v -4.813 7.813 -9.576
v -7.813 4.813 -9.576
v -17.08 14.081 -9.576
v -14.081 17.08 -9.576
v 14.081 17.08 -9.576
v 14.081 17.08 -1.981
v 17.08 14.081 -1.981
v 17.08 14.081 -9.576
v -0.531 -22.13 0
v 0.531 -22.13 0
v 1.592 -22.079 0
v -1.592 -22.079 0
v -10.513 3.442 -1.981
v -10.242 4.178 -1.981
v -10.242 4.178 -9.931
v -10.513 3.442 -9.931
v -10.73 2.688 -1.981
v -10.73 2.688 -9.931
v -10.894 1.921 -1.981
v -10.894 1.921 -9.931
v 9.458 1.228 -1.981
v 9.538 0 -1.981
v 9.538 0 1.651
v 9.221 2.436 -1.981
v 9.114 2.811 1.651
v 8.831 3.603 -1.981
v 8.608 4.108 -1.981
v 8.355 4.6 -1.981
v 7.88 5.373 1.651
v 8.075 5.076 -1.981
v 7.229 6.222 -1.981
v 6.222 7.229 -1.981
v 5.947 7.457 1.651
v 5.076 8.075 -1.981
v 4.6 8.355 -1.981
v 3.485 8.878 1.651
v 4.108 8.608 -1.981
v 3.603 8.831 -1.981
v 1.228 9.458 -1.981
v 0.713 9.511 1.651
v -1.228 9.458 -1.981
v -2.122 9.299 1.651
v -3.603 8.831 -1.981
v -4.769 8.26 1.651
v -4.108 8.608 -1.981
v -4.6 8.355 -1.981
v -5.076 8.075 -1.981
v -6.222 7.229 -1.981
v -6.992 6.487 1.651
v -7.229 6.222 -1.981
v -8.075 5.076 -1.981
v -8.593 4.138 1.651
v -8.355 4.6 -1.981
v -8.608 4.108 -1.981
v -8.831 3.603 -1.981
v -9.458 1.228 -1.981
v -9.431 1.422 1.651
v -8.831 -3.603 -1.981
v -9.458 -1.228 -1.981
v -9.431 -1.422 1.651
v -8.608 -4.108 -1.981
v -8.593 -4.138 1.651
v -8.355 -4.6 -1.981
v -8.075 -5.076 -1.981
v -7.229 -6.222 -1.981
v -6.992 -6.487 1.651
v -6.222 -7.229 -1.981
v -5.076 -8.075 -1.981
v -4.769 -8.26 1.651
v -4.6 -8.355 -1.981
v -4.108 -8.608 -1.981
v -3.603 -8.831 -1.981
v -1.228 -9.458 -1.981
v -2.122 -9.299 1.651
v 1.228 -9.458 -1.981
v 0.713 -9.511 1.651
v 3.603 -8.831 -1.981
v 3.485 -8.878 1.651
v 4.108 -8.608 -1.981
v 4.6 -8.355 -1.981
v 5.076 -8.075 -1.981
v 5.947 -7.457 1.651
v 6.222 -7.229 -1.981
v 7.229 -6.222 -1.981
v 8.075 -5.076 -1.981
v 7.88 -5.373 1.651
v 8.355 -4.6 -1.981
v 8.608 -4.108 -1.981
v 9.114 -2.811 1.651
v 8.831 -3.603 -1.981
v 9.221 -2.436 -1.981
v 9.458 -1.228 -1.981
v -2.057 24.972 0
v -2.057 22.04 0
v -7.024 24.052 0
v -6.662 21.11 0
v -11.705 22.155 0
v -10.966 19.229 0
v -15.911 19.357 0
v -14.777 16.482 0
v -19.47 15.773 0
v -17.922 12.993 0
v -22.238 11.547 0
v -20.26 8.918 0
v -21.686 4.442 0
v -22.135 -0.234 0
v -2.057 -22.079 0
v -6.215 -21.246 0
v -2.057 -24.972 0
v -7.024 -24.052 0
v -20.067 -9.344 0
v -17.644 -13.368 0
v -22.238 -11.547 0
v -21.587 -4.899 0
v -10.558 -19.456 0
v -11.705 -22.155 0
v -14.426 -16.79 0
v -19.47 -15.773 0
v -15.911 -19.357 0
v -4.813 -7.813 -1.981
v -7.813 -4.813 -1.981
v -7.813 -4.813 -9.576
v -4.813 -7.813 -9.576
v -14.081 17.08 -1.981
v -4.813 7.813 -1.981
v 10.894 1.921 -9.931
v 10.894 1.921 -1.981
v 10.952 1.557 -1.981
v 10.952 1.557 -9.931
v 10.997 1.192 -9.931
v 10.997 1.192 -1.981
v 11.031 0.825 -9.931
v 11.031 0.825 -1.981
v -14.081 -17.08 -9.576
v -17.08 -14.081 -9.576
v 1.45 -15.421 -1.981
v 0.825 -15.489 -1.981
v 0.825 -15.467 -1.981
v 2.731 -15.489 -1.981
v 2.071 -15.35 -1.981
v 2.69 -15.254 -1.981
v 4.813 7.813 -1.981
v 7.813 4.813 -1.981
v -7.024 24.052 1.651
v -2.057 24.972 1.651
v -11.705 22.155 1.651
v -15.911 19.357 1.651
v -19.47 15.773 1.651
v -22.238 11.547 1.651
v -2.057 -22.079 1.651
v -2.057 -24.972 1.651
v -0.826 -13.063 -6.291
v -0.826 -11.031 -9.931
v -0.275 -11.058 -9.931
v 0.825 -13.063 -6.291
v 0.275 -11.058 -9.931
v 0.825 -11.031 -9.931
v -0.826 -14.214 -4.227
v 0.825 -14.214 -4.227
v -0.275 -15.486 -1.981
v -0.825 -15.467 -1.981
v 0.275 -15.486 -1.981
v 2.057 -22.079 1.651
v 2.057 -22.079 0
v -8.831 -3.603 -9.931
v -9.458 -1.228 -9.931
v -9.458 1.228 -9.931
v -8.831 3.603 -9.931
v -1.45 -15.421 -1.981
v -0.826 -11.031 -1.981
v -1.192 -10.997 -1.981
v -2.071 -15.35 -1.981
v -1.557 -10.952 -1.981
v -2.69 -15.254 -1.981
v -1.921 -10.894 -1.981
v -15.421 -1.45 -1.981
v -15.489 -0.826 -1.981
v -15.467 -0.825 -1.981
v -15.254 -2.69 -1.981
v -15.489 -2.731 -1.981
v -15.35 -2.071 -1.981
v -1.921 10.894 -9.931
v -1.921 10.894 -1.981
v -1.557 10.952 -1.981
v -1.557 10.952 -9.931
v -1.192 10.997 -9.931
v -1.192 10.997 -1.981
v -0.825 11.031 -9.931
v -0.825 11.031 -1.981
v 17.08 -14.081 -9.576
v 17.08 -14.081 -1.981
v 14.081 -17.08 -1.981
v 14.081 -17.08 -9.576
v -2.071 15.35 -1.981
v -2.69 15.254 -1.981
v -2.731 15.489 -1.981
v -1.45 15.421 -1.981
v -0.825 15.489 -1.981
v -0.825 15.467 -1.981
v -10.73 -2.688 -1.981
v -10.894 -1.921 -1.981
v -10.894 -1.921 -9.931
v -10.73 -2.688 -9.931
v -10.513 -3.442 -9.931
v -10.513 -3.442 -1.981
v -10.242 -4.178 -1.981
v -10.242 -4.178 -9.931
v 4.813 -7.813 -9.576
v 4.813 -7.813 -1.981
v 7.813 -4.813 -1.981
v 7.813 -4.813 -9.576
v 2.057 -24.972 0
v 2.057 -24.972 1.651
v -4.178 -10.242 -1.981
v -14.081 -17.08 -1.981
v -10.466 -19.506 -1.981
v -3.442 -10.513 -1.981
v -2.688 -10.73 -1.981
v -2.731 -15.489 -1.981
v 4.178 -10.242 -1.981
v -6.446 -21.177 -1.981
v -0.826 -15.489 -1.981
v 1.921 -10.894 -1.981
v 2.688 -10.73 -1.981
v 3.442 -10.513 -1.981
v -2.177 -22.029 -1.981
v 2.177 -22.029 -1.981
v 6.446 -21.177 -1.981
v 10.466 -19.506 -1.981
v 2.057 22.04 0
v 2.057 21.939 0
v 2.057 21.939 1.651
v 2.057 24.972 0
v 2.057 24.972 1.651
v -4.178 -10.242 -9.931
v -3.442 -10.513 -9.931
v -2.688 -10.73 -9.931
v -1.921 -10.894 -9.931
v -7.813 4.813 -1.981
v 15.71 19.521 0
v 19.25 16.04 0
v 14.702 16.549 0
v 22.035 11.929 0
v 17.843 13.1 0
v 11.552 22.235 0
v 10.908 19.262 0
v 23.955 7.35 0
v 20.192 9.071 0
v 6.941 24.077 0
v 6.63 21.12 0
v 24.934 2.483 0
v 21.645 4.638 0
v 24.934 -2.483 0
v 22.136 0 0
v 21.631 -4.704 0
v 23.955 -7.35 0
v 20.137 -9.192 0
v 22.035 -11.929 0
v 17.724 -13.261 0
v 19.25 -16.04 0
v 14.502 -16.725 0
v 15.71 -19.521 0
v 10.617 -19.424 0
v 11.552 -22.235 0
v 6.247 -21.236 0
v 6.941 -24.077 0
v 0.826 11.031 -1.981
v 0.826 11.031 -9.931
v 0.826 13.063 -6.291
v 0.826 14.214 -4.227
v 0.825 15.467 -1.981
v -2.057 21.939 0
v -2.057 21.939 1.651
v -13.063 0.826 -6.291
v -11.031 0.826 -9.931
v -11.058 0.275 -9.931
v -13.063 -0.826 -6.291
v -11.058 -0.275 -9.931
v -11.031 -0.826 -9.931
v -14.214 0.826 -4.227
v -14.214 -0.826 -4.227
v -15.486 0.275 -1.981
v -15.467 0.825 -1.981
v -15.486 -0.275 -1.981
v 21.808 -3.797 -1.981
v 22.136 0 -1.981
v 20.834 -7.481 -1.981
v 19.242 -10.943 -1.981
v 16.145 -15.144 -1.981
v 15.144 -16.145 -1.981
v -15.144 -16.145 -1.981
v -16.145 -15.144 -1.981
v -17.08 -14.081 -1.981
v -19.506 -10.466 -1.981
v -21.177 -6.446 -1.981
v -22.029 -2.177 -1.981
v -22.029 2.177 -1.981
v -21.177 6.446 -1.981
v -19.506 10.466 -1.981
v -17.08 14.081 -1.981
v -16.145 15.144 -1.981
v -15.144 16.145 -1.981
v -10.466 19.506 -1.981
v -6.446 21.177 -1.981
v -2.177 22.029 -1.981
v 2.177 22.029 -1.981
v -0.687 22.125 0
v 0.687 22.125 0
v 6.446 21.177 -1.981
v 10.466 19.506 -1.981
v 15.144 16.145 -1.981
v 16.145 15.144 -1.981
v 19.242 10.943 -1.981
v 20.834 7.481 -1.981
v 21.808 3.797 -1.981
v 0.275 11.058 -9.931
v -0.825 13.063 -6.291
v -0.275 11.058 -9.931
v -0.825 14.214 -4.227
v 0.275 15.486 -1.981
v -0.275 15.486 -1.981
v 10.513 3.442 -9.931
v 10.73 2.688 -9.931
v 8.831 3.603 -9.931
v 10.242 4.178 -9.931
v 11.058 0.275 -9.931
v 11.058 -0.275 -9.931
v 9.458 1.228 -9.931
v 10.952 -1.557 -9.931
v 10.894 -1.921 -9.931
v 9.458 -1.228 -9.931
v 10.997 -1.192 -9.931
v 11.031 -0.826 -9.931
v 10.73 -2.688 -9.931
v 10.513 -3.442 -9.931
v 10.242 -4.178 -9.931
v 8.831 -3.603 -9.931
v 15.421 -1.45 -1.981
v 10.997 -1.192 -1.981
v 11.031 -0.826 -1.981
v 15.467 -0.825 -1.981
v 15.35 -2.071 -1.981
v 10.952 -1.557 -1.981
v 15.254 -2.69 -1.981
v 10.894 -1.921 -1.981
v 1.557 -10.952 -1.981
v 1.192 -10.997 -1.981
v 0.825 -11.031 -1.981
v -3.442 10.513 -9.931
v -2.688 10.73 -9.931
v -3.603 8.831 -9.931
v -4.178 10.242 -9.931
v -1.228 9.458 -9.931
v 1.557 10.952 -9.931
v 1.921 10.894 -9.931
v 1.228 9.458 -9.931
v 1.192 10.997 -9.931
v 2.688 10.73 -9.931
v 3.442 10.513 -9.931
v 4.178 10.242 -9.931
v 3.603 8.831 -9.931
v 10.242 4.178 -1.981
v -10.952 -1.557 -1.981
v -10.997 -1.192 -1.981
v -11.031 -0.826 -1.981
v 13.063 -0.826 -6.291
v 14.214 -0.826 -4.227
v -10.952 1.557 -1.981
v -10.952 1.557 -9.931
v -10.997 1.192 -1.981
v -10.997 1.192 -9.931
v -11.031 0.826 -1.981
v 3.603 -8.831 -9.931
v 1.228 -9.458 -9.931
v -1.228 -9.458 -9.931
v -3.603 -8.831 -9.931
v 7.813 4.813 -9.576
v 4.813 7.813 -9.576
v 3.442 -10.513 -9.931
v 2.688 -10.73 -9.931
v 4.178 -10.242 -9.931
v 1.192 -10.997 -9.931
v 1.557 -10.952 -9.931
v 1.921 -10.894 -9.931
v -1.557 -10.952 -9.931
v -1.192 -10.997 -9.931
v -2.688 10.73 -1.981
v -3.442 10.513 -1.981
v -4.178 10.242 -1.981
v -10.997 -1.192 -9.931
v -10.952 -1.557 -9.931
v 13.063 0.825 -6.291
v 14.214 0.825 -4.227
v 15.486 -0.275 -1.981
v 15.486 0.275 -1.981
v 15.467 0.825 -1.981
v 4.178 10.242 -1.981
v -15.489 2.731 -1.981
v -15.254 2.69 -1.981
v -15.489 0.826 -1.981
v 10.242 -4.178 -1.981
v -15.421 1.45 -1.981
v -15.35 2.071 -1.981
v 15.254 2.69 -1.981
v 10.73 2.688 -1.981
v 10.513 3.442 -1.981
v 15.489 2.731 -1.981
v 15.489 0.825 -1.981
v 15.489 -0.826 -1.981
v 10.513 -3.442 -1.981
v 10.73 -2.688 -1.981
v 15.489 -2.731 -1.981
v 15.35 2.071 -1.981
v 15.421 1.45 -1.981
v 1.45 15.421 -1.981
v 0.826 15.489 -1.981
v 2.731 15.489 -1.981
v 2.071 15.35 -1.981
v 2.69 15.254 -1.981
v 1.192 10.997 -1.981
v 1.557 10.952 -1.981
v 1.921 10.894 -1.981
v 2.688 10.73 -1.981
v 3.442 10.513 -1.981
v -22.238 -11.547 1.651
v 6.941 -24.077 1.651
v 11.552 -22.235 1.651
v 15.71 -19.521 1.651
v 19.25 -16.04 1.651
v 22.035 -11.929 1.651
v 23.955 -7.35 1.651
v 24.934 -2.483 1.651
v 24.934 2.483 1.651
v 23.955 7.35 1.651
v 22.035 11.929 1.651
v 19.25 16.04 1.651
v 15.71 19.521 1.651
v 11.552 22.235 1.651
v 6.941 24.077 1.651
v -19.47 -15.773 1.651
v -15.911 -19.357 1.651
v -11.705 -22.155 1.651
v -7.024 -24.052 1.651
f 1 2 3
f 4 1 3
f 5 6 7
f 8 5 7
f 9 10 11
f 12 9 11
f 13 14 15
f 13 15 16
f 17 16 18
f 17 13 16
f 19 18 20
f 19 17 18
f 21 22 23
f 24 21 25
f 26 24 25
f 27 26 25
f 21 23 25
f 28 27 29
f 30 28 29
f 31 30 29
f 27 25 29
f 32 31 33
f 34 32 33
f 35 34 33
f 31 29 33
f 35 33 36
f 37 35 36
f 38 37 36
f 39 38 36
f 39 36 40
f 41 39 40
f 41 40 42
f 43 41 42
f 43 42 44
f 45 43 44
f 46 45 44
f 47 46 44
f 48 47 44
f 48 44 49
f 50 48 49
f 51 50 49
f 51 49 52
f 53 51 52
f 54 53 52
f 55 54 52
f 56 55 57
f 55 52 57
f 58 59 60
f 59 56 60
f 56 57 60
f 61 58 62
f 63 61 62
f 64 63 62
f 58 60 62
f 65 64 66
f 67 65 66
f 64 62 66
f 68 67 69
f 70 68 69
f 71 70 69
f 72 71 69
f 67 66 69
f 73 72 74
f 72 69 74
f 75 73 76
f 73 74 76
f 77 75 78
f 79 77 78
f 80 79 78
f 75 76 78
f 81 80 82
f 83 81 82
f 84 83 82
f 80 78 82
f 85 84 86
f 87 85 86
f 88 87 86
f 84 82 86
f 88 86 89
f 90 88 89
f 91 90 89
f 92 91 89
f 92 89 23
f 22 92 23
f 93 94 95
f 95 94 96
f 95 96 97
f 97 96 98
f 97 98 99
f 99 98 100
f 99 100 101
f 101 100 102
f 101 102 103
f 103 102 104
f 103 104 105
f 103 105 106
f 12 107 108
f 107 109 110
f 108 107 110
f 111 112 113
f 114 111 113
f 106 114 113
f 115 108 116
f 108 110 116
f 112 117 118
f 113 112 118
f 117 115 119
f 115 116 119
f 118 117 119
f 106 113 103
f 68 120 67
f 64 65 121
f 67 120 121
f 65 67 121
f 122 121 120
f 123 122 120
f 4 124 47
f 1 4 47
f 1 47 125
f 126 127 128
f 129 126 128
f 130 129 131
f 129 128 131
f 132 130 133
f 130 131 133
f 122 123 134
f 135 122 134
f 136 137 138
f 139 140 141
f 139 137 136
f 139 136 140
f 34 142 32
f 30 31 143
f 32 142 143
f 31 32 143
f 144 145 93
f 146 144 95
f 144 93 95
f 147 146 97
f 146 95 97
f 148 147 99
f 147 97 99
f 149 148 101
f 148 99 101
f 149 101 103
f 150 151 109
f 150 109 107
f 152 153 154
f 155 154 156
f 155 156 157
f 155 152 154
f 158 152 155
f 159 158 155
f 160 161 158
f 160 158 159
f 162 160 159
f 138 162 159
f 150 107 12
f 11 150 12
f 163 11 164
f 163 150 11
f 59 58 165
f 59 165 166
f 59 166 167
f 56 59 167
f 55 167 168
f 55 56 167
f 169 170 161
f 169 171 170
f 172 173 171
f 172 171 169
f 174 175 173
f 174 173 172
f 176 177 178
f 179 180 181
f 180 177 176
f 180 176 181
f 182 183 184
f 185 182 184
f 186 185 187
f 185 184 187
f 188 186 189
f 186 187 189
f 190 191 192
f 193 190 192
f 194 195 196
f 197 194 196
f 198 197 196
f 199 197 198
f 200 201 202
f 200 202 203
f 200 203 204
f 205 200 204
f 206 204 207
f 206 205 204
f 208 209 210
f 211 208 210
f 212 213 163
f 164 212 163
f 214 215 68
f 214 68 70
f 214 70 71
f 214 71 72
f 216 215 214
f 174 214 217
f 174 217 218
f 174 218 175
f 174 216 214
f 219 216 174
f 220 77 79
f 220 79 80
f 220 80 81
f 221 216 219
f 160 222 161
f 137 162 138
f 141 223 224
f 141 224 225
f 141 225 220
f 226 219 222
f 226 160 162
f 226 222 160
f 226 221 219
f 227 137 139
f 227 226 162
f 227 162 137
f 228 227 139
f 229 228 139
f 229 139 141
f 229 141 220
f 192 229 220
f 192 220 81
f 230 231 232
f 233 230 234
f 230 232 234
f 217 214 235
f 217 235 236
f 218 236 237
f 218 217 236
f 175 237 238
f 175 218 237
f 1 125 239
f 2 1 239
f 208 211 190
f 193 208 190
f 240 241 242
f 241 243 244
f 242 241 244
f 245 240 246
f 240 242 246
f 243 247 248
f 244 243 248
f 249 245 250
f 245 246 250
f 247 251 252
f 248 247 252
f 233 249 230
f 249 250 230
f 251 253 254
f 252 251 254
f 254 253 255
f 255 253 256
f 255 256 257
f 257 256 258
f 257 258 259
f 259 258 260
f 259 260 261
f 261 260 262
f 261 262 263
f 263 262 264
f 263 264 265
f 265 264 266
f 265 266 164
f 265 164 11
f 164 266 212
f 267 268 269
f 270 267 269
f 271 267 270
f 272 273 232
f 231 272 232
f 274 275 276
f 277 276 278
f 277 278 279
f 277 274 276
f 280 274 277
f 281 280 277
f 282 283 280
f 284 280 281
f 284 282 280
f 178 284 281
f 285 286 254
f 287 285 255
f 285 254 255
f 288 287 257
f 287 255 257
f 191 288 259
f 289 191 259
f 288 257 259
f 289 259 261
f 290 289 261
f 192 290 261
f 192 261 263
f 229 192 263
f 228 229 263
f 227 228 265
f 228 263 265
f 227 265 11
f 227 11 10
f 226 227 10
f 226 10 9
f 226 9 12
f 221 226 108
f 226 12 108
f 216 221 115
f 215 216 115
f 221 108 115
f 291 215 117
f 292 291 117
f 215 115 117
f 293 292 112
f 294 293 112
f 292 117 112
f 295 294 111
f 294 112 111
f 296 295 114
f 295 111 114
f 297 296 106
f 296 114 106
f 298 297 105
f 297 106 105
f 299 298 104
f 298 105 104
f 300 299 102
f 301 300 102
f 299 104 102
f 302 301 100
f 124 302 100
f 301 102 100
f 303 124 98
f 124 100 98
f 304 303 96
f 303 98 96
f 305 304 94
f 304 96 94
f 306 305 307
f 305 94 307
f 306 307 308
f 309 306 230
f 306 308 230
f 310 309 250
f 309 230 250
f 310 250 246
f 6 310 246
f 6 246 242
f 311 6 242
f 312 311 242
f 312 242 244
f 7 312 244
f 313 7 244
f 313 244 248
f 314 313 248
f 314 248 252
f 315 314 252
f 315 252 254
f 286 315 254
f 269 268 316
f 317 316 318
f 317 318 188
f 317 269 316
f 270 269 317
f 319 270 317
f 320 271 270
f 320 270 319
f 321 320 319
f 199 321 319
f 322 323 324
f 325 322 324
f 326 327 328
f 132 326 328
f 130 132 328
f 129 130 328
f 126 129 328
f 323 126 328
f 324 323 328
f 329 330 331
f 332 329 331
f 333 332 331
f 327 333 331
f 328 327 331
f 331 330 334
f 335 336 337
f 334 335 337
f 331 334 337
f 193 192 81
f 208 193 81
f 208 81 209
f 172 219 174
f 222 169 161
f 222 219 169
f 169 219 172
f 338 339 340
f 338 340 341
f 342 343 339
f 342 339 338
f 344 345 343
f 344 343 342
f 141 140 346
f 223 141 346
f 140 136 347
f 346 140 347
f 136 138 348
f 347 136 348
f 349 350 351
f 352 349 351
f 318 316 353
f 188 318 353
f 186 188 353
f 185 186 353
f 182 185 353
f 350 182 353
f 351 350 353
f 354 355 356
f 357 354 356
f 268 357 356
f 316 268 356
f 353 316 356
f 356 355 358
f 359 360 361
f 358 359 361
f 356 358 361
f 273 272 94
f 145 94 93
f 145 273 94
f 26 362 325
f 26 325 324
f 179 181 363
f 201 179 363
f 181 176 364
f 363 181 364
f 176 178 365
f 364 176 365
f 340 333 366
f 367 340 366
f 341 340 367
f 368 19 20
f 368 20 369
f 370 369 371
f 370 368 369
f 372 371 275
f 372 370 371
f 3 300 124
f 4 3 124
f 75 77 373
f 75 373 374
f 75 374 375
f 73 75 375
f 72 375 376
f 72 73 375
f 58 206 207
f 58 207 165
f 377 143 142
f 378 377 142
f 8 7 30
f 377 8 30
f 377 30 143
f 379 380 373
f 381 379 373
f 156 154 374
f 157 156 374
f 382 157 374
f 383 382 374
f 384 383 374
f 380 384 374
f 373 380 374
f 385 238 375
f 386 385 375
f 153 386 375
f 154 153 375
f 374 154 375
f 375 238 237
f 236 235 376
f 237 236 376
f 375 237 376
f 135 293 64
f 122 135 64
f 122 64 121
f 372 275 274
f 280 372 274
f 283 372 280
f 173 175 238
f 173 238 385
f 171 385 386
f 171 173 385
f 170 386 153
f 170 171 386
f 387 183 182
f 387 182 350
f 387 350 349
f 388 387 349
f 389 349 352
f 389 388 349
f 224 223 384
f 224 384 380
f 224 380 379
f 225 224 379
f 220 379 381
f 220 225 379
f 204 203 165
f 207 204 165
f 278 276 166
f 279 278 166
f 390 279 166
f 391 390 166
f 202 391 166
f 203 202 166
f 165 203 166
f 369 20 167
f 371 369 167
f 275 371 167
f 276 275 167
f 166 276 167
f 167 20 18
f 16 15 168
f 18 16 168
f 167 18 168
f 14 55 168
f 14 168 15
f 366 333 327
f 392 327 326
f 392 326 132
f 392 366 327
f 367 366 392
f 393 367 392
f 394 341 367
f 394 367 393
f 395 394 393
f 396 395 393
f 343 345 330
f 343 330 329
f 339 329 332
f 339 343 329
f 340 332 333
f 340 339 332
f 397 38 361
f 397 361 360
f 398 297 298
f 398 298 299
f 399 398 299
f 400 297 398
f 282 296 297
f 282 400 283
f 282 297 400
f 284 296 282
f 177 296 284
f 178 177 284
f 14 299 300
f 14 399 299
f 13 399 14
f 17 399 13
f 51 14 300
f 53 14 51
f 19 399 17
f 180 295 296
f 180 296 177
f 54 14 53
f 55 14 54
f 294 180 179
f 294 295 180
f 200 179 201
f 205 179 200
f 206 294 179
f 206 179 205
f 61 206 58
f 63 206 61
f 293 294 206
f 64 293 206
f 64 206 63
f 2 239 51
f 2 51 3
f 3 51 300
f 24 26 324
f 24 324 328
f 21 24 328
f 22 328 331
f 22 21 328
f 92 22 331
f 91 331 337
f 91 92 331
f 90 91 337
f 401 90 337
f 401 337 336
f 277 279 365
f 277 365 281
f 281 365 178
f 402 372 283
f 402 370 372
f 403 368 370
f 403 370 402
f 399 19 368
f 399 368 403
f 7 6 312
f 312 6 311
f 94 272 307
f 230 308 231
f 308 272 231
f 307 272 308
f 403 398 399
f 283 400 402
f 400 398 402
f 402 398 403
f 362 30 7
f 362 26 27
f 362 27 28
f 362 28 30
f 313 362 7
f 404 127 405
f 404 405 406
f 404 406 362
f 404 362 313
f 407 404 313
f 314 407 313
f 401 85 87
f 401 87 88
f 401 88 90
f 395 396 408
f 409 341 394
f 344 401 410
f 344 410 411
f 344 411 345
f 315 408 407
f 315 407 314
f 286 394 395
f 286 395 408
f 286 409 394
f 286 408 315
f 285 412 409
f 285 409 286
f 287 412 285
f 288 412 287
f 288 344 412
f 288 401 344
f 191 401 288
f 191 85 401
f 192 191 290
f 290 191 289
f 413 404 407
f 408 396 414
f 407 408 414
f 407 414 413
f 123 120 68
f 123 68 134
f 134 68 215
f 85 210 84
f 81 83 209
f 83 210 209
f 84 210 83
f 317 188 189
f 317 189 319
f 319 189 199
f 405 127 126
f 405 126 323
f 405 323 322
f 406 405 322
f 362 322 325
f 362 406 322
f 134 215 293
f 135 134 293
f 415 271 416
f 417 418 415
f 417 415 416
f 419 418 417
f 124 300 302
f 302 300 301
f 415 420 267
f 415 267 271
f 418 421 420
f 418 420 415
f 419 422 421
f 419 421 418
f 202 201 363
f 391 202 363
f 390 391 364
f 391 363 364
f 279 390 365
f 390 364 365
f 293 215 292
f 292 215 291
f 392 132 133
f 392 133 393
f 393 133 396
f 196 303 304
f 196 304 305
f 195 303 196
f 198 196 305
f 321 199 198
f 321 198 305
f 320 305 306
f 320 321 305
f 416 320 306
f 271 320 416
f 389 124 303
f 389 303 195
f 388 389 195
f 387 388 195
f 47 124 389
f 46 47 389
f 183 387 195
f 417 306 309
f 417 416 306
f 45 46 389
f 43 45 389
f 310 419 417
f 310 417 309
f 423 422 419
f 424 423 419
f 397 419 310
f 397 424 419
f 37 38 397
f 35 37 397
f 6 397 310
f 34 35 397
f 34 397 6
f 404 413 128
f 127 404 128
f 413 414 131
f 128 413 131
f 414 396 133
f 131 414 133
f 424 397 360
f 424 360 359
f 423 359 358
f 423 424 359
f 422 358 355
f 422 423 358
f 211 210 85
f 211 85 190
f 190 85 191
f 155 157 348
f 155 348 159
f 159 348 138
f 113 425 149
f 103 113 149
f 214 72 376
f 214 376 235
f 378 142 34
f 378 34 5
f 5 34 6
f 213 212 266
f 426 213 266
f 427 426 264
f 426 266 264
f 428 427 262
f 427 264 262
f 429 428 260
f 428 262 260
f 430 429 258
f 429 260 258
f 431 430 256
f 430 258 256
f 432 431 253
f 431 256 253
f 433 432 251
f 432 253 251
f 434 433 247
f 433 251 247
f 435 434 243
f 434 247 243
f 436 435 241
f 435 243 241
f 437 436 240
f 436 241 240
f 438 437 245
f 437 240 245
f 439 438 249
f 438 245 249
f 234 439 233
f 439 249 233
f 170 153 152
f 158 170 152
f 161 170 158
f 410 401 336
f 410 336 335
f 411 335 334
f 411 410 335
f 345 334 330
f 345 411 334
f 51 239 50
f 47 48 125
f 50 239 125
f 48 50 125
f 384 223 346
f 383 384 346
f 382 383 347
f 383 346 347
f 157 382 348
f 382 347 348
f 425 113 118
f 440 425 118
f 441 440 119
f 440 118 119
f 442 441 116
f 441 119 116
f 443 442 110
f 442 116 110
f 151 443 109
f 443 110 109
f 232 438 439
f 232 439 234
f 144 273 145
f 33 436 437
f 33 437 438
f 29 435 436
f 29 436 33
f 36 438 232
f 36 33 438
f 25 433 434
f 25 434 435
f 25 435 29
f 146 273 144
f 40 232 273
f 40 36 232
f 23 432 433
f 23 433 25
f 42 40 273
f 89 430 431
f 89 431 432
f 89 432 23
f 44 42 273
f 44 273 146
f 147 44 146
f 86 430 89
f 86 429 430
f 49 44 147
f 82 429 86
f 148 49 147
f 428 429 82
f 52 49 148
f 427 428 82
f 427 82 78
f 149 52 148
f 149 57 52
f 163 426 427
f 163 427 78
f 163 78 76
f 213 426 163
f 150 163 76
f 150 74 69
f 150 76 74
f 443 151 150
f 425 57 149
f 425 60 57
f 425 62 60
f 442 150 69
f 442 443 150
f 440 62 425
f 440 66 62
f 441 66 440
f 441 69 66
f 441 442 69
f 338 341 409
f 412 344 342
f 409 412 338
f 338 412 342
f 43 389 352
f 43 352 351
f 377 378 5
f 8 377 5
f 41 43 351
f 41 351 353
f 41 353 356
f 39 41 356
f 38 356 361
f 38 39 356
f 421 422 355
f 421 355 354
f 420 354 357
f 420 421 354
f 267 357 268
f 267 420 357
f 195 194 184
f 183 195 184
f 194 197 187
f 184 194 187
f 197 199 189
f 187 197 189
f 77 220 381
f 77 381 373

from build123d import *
from build123d.topology import SkipClean

# Parameters (mm, degrees)
SKETCH1_R           = 25.0571
BOSS_EXTRUDE1_DEPTH = 1.651
SKETCH2_W           = 50.1142
SKETCH2_H           = 50.1142
CUT_EXTRUDE1_DEPTH  = 36.474530607
SKETCH3_W           = 4.1148
SKETCH3_H           = 6.235392346
SKETCH3_H_2         = 5.956607654
CUT_EXTRUDE2_DEPTH  = 36.474530607
SKETCH4_R           = 22.1361
BOSS_EXTRUDE2_DEPTH = 1.9812
SKETCH6_R           = 9.5377
CUT_EXTRUDE3_DEPTH  = 36.562290462
BOSS_EXTRUDE3_DEPTH = 7.5946
BOSS_EXTRUDE4_DEPTH = 7.9502
REVOLVE1_ANGLE      = 20
CUT_EXTRUDE4_START  = -7.9502
CUT_EXTRUDE4_DEPTH  = 7.9502
CIRPATTERN1_COUNT   = 4


# Read off the part's stored shape, not the designer's step: Revolve1
with BuildPart() as part:
    # Sketch1 → Boss-Extrude1 (new body)
    with BuildSketch(Plane.XY):
        with Locations(Location((0, 0, 0), (0, 0, 180))):
            Circle(SKETCH1_R)
    extrude(amount=BOSS_EXTRUDE1_DEPTH)

    # Sketch2 → Cut-Extrude1 (cut, through all)
    with BuildSketch(Plane.XY.offset(1.651)):
        with Locations((-47.2948, 0)):
            Rectangle(SKETCH2_W, SKETCH2_H)
    extrude(amount=-CUT_EXTRUDE1_DEPTH, mode=Mode.SUBTRACT)

    # Sketch3 → Cut-Extrude2 (cut, through all)
    with BuildSketch(Plane.XY.offset(1.651)):
        with Locations((0, 25.0571)):
            Rectangle(SKETCH3_W, SKETCH3_H)
        with Locations((0, -25.0571)):
            Rectangle(SKETCH3_W, SKETCH3_H_2)
    extrude(amount=-CUT_EXTRUDE2_DEPTH, mode=Mode.SUBTRACT)

    # Sketch4 → Boss-Extrude2 (add)
    with BuildSketch(Plane(origin=(0, 0, 0), x_dir=(-1, 0, 0), z_dir=(0, 0, -1))):
        with Locations(Location((0, 0, 0), (0, 0, 180))):
            Circle(SKETCH4_R)
    extrude(amount=BOSS_EXTRUDE2_DEPTH)

    # Sketch6 → Cut-Extrude3 (cut, through all)
    with BuildSketch(Plane.XY.offset(1.651)):
        Circle(SKETCH6_R)
    extrude(amount=-CUT_EXTRUDE3_DEPTH, mode=Mode.SUBTRACT)

    # Sketch5 → Boss-Extrude3 (add)
    with BuildSketch(Plane(origin=(0, 0, -1.9812), x_dir=(-1, 0, 0), z_dir=(0, 0, -1))):
        Polygon((17.080278923, -14.080873379), (7.812654606, -4.813249062), (4.813249062, -7.812654606), (14.080873379, -17.080278923), align=None)
    boss_extrude3 = extrude(amount=BOSS_EXTRUDE3_DEPTH)

    # Sketch7 → Boss-Extrude4 (add)
    with SkipClean():  # the faces are left unmerged after this step: merging them gives an invalid solid
        with BuildSketch(Plane(origin=(0, 0, -1.9812), x_dir=(-1, 0, 0), z_dir=(0, 0, -1))):
            with BuildLine():
                Line((8.831119657, 3.602644432), (10.242217338, 4.1783))
                ThreePointArc((10.242217338, 4.1783), (11.0617, 0), (10.242217338, -4.1783))
                Line((10.242217338, -4.1783), (8.831119657, -3.602644432))
                ThreePointArc((8.831119657, -3.602644432), (9.5377, 0), (8.831119657, 3.602644432))
            make_face()
        boss_extrude4 = extrude(amount=BOSS_EXTRUDE4_DEPTH)

    # Revolve1 outline → Revolve1 (revolve)
    with SkipClean():  # the faces are left unmerged after this step: merging them gives an invalid solid
        with BuildSketch(Plane(origin=(0, 0, 0), x_dir=(-0.9848077530122078, 0.17364817766693158, 0), z_dir=(0.17364817766693158, 0.9848077530122078, 0))):
            Polygon((11.0617, -1.9812), (11.0617, -9.9314), (15.48894278, -1.9812), align=None)
        revolve1 = revolve(axis=Axis((0, 0, 0), (0, 0, 1)), revolution_arc=REVOLVE1_ANGLE)

    # Sketch9 → Cut-Extrude4 (cut)
    with SkipClean():  # the faces are left unmerged after this step: merging them gives an invalid solid
        with BuildSketch(Plane(origin=(0, 0, -9.9314), x_dir=(-1, 0, 0), z_dir=(0, 0, -1)).offset(CUT_EXTRUDE4_START)):
            with BuildLine():
                Line((11.030854756, -0.8255), (15.48894278, -0.8255))
                Line((15.48894278, -0.8255), (15.48894278, -2.731118515))
                Line((15.48894278, -2.731118515), (10.893647921, -1.920844047))
                ThreePointArc((10.893647921, -1.920844047), (10.975923608, -1.374884662), (11.030854756, -0.8255))
            make_face()
            with BuildLine():
                Line((11.030854756, 0.8255), (15.48894278, 0.8255))
                Line((15.48894278, 0.8255), (15.48894278, 2.731118515))
                Line((15.48894278, 2.731118515), (10.893647921, 1.920844047))
                ThreePointArc((10.893647921, 1.920844047), (10.975923608, 1.374884662), (11.030854756, 0.8255))
            make_face()
        cut_extrude4 = extrude(amount=CUT_EXTRUDE4_DEPTH, mode=Mode.SUBTRACT)

    # CirPattern1: Boss-Extrude3, Boss-Extrude4, Revolve1, Cut-Extrude4 ×4 about axis
    with SkipClean():  # the faces are left unmerged after this step: merging them gives an invalid solid
        cirpattern1_axis = Axis((0, 0, 0), (0, 0, 1))
        add([boss_extrude3.rotate(cirpattern1_axis, i * 360 / CIRPATTERN1_COUNT) for i in range(1, CIRPATTERN1_COUNT)])
        add([boss_extrude4.rotate(cirpattern1_axis, i * 360 / CIRPATTERN1_COUNT) for i in range(1, CIRPATTERN1_COUNT)])
        add([revolve1.rotate(cirpattern1_axis, i * 360 / CIRPATTERN1_COUNT) for i in range(1, CIRPATTERN1_COUNT)])
        add([cut_extrude4.rotate(cirpattern1_axis, i * 360 / CIRPATTERN1_COUNT) for i in range(1, CIRPATTERN1_COUNT)], mode=Mode.SUBTRACT)


solid = part.part
